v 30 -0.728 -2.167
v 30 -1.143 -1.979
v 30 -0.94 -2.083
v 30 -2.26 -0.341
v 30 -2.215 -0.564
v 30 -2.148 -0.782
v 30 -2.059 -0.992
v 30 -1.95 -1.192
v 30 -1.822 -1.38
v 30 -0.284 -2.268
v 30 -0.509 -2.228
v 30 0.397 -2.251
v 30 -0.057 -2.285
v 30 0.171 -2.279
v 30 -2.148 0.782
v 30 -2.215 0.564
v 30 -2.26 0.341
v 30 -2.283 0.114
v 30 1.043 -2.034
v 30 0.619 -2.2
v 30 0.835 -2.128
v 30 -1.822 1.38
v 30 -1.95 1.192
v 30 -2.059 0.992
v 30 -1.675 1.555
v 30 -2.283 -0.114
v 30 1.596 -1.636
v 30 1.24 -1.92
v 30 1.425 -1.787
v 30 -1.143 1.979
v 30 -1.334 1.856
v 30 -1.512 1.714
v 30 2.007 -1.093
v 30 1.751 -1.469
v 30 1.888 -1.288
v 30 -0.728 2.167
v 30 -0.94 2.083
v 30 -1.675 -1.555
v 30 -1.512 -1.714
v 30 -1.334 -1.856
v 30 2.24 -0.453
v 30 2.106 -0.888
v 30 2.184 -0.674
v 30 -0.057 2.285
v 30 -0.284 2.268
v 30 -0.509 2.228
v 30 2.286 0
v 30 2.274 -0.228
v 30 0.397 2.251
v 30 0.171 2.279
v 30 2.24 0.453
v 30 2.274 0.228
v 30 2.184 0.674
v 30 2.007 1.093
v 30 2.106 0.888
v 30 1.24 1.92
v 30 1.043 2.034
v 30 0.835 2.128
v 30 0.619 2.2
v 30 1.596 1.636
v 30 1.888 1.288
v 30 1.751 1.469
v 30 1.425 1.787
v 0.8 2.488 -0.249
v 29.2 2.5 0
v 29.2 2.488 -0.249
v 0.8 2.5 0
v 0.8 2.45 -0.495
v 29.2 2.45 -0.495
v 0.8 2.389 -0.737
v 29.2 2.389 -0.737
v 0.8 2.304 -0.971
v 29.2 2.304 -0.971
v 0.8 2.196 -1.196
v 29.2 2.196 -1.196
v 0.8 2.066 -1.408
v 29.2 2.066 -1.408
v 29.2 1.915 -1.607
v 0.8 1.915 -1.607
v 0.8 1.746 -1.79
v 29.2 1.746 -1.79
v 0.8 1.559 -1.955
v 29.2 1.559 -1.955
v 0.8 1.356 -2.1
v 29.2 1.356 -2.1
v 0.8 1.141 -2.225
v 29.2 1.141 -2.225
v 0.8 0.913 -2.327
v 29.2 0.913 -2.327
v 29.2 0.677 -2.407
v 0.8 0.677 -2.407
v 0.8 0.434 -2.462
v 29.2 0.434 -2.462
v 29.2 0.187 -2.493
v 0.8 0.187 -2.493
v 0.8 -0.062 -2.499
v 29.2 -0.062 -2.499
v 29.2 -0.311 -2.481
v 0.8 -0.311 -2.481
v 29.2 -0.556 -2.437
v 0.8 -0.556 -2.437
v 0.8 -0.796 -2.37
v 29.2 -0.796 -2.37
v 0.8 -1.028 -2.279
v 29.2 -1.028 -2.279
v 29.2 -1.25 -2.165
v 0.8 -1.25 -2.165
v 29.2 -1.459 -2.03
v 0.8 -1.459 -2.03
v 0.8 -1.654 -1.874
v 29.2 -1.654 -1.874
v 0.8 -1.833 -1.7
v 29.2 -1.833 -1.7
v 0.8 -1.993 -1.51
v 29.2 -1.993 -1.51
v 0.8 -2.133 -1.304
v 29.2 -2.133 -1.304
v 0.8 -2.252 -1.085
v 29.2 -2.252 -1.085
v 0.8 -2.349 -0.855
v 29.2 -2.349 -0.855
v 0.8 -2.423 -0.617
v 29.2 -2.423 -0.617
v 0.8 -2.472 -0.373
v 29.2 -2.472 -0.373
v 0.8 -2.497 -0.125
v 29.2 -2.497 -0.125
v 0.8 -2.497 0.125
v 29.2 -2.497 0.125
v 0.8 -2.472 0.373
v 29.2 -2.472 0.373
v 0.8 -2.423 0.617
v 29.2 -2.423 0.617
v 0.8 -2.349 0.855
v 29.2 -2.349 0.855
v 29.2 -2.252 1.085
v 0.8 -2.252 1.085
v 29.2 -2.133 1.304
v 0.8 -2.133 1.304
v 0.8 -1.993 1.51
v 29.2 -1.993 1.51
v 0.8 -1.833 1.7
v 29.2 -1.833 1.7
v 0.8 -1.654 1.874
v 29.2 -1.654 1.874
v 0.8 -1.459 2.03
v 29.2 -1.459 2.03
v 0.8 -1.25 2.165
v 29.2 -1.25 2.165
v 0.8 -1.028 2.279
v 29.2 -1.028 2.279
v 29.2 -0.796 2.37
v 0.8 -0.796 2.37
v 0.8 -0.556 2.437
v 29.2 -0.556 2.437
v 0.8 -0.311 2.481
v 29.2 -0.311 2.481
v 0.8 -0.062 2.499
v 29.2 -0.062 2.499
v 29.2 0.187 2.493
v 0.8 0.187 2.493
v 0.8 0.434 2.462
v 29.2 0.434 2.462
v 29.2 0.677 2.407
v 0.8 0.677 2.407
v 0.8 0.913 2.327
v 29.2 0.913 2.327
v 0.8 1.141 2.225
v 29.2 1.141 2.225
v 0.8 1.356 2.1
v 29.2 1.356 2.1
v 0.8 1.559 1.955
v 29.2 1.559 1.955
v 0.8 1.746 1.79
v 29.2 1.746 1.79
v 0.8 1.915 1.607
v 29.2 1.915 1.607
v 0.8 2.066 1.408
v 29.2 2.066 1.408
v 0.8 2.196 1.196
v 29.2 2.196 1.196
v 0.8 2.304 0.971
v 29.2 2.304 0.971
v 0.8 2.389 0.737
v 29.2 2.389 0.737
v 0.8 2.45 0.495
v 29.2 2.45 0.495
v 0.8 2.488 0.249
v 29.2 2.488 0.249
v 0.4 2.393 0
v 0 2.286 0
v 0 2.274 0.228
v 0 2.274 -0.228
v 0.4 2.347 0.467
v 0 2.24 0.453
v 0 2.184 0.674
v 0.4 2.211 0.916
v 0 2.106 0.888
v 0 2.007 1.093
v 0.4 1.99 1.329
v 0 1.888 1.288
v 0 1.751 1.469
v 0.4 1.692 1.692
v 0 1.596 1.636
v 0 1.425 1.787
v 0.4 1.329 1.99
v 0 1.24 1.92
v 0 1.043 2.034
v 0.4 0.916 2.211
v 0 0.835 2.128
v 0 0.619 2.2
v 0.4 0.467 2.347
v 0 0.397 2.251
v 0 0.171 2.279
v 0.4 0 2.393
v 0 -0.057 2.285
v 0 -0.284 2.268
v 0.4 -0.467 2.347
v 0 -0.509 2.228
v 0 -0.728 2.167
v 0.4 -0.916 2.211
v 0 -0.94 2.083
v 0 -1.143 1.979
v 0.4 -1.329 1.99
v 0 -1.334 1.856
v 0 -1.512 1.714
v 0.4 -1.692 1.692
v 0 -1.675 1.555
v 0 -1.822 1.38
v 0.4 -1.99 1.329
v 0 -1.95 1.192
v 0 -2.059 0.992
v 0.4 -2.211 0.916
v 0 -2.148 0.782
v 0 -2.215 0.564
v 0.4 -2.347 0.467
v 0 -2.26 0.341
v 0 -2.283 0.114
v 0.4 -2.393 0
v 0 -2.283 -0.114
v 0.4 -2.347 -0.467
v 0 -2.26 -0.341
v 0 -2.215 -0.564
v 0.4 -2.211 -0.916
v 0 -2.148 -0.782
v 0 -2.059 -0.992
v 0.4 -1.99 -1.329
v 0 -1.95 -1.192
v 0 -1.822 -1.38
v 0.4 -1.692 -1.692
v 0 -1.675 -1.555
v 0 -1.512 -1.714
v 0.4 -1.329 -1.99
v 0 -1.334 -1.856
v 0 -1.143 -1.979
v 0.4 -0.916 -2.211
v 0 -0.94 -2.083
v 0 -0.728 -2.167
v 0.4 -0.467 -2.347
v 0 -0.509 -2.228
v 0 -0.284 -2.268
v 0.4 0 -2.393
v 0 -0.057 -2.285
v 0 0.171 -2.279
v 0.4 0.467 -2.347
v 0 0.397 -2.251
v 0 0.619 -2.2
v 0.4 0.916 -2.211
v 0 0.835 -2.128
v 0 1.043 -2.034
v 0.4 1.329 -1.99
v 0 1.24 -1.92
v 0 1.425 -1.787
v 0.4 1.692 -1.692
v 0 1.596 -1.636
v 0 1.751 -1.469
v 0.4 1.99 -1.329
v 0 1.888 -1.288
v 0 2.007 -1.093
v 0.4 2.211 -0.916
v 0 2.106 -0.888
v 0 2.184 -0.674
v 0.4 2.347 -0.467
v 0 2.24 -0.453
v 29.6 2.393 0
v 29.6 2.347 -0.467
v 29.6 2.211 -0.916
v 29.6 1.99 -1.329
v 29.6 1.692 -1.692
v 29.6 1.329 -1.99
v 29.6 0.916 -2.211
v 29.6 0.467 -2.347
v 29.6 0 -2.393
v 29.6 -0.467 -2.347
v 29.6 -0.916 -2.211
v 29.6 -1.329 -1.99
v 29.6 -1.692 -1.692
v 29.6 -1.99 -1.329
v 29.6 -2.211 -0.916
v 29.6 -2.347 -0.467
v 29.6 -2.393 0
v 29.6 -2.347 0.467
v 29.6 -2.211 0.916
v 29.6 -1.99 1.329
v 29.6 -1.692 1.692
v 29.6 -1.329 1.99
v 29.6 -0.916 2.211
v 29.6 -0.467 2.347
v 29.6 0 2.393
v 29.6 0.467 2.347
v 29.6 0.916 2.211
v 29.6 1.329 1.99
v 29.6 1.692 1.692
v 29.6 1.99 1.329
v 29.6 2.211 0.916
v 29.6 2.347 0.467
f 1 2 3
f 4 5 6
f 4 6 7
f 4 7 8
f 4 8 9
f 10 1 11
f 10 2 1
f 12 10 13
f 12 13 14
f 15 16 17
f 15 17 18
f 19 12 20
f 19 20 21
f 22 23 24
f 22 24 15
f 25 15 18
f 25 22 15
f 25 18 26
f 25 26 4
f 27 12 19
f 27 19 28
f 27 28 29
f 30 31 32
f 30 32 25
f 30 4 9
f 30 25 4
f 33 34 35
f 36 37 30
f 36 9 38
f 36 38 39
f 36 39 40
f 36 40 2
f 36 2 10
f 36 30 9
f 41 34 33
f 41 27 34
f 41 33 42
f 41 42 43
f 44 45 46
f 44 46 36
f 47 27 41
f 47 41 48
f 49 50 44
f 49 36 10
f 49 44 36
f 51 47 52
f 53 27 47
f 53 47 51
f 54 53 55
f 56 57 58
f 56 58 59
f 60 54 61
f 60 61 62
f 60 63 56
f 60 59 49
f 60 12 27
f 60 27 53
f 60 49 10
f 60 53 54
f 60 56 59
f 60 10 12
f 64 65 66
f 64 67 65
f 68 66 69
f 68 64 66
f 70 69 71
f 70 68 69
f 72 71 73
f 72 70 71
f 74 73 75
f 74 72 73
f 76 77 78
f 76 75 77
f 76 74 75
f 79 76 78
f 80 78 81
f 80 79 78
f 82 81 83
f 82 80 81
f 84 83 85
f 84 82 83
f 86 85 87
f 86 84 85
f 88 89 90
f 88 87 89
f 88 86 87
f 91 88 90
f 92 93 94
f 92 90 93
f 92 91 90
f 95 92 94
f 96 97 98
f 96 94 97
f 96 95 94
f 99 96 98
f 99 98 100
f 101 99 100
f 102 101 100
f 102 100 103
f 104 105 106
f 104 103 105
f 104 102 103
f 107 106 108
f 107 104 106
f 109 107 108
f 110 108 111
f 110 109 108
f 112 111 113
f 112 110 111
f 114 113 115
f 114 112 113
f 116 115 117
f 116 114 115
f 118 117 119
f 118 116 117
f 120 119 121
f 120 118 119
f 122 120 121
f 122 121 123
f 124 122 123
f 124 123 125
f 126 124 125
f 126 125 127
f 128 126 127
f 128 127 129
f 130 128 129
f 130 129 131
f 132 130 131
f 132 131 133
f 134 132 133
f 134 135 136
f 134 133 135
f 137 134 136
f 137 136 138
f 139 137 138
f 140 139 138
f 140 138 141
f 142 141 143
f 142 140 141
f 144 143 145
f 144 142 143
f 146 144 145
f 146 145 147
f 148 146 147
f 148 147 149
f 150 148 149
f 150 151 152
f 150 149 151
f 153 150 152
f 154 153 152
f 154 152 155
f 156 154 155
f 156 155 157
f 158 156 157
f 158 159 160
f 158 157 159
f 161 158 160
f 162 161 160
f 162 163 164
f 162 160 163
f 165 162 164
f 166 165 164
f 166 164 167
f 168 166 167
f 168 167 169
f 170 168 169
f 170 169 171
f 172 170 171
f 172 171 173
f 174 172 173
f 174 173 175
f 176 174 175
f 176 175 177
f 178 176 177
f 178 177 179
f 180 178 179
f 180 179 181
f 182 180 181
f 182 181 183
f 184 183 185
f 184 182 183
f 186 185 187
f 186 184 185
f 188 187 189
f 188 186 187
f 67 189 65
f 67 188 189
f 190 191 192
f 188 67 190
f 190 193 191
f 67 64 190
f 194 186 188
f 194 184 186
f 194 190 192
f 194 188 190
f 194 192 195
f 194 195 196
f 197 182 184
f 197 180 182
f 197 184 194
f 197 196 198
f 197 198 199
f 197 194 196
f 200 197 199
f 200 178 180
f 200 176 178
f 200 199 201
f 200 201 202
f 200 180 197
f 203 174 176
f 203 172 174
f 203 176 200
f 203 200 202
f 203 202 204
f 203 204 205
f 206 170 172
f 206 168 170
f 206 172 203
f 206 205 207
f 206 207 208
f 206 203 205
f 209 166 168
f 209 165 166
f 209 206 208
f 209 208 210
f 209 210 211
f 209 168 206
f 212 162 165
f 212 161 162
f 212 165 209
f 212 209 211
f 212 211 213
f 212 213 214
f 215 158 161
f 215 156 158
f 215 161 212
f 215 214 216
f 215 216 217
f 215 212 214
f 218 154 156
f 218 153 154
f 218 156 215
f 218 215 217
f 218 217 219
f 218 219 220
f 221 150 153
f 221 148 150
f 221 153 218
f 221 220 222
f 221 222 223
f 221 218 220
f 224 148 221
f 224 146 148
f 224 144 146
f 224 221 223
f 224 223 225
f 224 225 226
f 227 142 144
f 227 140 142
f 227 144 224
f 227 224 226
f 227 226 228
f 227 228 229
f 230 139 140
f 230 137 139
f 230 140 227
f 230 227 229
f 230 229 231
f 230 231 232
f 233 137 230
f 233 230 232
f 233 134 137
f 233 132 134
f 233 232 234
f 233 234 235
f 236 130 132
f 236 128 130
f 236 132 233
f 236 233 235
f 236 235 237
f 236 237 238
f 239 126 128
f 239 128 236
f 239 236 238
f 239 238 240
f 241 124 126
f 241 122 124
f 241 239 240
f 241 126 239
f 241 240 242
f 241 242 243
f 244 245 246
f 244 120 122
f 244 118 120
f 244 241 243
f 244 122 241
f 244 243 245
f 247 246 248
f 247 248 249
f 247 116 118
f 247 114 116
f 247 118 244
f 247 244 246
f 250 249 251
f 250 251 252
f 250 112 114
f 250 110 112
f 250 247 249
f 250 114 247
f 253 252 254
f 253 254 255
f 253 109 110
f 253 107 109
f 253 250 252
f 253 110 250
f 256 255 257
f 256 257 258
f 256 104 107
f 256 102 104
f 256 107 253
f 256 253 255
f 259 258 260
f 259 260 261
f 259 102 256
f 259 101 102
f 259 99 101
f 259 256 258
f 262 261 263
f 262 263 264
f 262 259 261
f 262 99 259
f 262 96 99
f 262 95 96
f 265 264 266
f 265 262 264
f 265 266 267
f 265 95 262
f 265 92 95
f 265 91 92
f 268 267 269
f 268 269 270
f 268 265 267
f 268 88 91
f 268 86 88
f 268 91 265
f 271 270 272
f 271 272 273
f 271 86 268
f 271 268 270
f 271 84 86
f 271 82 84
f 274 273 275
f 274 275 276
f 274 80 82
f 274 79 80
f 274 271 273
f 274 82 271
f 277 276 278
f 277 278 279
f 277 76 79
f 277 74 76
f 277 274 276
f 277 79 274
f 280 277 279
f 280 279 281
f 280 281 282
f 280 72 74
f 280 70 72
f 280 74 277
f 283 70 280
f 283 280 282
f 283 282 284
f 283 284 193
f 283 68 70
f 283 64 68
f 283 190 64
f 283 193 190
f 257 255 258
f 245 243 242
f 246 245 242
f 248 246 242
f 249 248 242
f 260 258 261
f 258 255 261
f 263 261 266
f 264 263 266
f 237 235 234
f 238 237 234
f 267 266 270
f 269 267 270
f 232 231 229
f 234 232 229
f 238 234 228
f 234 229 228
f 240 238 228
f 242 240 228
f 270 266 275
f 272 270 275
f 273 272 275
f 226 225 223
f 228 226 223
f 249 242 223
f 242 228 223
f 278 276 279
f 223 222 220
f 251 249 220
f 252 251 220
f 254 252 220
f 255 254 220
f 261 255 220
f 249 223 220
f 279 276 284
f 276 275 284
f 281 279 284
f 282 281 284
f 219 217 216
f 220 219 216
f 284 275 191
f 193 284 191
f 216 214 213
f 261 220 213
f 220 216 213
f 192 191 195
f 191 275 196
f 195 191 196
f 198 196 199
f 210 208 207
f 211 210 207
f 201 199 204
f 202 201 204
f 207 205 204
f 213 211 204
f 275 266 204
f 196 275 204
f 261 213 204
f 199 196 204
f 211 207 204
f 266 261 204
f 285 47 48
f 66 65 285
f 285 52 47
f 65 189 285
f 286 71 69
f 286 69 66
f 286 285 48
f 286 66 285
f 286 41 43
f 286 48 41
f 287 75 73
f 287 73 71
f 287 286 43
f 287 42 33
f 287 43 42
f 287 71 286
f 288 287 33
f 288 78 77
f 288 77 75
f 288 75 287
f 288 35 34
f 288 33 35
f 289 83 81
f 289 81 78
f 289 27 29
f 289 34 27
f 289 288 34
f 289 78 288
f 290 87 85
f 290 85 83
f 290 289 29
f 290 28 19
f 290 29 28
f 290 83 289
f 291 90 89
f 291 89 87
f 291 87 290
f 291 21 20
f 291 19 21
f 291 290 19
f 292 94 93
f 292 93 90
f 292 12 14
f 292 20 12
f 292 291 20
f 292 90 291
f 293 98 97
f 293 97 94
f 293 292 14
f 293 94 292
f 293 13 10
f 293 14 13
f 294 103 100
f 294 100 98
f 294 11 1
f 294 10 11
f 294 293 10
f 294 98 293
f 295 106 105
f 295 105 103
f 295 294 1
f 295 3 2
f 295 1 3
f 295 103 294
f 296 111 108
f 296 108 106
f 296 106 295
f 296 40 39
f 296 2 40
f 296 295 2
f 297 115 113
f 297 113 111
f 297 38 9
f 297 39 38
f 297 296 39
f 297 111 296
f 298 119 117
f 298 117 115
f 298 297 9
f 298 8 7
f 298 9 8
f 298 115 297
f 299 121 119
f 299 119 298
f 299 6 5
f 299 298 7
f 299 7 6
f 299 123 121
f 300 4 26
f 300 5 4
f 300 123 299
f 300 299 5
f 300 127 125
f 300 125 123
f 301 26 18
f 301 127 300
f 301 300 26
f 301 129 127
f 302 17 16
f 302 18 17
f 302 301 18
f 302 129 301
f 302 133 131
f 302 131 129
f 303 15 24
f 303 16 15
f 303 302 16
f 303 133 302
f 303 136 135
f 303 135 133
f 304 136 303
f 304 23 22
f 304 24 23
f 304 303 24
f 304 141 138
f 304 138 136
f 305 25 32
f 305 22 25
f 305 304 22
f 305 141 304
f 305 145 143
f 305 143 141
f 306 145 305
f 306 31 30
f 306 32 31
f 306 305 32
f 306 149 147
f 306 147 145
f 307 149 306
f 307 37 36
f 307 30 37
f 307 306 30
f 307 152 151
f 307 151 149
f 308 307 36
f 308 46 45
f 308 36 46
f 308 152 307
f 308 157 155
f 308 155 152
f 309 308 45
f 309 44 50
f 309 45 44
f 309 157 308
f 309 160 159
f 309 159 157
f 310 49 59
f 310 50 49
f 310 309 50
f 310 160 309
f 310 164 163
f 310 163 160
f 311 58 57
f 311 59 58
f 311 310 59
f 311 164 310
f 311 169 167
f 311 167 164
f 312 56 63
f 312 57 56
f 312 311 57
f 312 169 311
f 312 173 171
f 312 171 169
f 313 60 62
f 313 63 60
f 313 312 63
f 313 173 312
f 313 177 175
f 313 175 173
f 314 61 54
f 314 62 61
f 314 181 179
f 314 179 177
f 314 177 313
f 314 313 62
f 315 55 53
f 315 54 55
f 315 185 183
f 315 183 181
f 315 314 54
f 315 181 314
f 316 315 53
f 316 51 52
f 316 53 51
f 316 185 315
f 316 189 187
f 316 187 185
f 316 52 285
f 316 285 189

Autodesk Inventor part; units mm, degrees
ref_plane "YZ Plane" through (0, 0, 0) normal (1, 0, 0) x (0, 1, 0)
ref_plane "XZ Plane" through (0, 0, 0) normal (0, 1, 0) x (-1, 0, 0)
ref_plane "XY Plane" through (0, 0, 0) normal (0, 0, 1) x (1, 0, 0)
sketch "Sketch" plane through (0, 0, 0) normal (1, 0, 0) x (0, 1, 0)
  circle A0 centre (0, 0) radius 2.5
  dimension "d1" = 5
extrude "Body" add sketch "Sketch" along normal blind 30
chamfer "Chamfer1" distance 0.8 angle 15 1 edges at (0, -2.5, 0) measured on face at (20, 2.4919, -0.2012)
chamfer "Sketch2" distance 0.8 angle 15 1 edges at (30, -2.5, 0) measured on face at (20.2667, 2.4919, -0.2012)
equation "\"d1\" = NND"
equation "\"d2\" = NLG"
equation "\"d8\" = PHH"
equation "\"d9\" = FAWI"
equation "\"d12\" = PHH"
equation "\"d4\" = PHH"
equation "\"d5\" = FAWI"
equation "\"d11\" = PHH"
equation "\"NND\" = 5"
equation "\"NLG\" = 30"
equation "\"PHH\" = 0.8"
equation "\"FAWI\" = 15deg"
equation "\"PHH2\" = PHH"
equation "\"FAWI2\" = 15deg"
properties part number "ISO 8734 - 5 x 30 - A" material "Steel"
